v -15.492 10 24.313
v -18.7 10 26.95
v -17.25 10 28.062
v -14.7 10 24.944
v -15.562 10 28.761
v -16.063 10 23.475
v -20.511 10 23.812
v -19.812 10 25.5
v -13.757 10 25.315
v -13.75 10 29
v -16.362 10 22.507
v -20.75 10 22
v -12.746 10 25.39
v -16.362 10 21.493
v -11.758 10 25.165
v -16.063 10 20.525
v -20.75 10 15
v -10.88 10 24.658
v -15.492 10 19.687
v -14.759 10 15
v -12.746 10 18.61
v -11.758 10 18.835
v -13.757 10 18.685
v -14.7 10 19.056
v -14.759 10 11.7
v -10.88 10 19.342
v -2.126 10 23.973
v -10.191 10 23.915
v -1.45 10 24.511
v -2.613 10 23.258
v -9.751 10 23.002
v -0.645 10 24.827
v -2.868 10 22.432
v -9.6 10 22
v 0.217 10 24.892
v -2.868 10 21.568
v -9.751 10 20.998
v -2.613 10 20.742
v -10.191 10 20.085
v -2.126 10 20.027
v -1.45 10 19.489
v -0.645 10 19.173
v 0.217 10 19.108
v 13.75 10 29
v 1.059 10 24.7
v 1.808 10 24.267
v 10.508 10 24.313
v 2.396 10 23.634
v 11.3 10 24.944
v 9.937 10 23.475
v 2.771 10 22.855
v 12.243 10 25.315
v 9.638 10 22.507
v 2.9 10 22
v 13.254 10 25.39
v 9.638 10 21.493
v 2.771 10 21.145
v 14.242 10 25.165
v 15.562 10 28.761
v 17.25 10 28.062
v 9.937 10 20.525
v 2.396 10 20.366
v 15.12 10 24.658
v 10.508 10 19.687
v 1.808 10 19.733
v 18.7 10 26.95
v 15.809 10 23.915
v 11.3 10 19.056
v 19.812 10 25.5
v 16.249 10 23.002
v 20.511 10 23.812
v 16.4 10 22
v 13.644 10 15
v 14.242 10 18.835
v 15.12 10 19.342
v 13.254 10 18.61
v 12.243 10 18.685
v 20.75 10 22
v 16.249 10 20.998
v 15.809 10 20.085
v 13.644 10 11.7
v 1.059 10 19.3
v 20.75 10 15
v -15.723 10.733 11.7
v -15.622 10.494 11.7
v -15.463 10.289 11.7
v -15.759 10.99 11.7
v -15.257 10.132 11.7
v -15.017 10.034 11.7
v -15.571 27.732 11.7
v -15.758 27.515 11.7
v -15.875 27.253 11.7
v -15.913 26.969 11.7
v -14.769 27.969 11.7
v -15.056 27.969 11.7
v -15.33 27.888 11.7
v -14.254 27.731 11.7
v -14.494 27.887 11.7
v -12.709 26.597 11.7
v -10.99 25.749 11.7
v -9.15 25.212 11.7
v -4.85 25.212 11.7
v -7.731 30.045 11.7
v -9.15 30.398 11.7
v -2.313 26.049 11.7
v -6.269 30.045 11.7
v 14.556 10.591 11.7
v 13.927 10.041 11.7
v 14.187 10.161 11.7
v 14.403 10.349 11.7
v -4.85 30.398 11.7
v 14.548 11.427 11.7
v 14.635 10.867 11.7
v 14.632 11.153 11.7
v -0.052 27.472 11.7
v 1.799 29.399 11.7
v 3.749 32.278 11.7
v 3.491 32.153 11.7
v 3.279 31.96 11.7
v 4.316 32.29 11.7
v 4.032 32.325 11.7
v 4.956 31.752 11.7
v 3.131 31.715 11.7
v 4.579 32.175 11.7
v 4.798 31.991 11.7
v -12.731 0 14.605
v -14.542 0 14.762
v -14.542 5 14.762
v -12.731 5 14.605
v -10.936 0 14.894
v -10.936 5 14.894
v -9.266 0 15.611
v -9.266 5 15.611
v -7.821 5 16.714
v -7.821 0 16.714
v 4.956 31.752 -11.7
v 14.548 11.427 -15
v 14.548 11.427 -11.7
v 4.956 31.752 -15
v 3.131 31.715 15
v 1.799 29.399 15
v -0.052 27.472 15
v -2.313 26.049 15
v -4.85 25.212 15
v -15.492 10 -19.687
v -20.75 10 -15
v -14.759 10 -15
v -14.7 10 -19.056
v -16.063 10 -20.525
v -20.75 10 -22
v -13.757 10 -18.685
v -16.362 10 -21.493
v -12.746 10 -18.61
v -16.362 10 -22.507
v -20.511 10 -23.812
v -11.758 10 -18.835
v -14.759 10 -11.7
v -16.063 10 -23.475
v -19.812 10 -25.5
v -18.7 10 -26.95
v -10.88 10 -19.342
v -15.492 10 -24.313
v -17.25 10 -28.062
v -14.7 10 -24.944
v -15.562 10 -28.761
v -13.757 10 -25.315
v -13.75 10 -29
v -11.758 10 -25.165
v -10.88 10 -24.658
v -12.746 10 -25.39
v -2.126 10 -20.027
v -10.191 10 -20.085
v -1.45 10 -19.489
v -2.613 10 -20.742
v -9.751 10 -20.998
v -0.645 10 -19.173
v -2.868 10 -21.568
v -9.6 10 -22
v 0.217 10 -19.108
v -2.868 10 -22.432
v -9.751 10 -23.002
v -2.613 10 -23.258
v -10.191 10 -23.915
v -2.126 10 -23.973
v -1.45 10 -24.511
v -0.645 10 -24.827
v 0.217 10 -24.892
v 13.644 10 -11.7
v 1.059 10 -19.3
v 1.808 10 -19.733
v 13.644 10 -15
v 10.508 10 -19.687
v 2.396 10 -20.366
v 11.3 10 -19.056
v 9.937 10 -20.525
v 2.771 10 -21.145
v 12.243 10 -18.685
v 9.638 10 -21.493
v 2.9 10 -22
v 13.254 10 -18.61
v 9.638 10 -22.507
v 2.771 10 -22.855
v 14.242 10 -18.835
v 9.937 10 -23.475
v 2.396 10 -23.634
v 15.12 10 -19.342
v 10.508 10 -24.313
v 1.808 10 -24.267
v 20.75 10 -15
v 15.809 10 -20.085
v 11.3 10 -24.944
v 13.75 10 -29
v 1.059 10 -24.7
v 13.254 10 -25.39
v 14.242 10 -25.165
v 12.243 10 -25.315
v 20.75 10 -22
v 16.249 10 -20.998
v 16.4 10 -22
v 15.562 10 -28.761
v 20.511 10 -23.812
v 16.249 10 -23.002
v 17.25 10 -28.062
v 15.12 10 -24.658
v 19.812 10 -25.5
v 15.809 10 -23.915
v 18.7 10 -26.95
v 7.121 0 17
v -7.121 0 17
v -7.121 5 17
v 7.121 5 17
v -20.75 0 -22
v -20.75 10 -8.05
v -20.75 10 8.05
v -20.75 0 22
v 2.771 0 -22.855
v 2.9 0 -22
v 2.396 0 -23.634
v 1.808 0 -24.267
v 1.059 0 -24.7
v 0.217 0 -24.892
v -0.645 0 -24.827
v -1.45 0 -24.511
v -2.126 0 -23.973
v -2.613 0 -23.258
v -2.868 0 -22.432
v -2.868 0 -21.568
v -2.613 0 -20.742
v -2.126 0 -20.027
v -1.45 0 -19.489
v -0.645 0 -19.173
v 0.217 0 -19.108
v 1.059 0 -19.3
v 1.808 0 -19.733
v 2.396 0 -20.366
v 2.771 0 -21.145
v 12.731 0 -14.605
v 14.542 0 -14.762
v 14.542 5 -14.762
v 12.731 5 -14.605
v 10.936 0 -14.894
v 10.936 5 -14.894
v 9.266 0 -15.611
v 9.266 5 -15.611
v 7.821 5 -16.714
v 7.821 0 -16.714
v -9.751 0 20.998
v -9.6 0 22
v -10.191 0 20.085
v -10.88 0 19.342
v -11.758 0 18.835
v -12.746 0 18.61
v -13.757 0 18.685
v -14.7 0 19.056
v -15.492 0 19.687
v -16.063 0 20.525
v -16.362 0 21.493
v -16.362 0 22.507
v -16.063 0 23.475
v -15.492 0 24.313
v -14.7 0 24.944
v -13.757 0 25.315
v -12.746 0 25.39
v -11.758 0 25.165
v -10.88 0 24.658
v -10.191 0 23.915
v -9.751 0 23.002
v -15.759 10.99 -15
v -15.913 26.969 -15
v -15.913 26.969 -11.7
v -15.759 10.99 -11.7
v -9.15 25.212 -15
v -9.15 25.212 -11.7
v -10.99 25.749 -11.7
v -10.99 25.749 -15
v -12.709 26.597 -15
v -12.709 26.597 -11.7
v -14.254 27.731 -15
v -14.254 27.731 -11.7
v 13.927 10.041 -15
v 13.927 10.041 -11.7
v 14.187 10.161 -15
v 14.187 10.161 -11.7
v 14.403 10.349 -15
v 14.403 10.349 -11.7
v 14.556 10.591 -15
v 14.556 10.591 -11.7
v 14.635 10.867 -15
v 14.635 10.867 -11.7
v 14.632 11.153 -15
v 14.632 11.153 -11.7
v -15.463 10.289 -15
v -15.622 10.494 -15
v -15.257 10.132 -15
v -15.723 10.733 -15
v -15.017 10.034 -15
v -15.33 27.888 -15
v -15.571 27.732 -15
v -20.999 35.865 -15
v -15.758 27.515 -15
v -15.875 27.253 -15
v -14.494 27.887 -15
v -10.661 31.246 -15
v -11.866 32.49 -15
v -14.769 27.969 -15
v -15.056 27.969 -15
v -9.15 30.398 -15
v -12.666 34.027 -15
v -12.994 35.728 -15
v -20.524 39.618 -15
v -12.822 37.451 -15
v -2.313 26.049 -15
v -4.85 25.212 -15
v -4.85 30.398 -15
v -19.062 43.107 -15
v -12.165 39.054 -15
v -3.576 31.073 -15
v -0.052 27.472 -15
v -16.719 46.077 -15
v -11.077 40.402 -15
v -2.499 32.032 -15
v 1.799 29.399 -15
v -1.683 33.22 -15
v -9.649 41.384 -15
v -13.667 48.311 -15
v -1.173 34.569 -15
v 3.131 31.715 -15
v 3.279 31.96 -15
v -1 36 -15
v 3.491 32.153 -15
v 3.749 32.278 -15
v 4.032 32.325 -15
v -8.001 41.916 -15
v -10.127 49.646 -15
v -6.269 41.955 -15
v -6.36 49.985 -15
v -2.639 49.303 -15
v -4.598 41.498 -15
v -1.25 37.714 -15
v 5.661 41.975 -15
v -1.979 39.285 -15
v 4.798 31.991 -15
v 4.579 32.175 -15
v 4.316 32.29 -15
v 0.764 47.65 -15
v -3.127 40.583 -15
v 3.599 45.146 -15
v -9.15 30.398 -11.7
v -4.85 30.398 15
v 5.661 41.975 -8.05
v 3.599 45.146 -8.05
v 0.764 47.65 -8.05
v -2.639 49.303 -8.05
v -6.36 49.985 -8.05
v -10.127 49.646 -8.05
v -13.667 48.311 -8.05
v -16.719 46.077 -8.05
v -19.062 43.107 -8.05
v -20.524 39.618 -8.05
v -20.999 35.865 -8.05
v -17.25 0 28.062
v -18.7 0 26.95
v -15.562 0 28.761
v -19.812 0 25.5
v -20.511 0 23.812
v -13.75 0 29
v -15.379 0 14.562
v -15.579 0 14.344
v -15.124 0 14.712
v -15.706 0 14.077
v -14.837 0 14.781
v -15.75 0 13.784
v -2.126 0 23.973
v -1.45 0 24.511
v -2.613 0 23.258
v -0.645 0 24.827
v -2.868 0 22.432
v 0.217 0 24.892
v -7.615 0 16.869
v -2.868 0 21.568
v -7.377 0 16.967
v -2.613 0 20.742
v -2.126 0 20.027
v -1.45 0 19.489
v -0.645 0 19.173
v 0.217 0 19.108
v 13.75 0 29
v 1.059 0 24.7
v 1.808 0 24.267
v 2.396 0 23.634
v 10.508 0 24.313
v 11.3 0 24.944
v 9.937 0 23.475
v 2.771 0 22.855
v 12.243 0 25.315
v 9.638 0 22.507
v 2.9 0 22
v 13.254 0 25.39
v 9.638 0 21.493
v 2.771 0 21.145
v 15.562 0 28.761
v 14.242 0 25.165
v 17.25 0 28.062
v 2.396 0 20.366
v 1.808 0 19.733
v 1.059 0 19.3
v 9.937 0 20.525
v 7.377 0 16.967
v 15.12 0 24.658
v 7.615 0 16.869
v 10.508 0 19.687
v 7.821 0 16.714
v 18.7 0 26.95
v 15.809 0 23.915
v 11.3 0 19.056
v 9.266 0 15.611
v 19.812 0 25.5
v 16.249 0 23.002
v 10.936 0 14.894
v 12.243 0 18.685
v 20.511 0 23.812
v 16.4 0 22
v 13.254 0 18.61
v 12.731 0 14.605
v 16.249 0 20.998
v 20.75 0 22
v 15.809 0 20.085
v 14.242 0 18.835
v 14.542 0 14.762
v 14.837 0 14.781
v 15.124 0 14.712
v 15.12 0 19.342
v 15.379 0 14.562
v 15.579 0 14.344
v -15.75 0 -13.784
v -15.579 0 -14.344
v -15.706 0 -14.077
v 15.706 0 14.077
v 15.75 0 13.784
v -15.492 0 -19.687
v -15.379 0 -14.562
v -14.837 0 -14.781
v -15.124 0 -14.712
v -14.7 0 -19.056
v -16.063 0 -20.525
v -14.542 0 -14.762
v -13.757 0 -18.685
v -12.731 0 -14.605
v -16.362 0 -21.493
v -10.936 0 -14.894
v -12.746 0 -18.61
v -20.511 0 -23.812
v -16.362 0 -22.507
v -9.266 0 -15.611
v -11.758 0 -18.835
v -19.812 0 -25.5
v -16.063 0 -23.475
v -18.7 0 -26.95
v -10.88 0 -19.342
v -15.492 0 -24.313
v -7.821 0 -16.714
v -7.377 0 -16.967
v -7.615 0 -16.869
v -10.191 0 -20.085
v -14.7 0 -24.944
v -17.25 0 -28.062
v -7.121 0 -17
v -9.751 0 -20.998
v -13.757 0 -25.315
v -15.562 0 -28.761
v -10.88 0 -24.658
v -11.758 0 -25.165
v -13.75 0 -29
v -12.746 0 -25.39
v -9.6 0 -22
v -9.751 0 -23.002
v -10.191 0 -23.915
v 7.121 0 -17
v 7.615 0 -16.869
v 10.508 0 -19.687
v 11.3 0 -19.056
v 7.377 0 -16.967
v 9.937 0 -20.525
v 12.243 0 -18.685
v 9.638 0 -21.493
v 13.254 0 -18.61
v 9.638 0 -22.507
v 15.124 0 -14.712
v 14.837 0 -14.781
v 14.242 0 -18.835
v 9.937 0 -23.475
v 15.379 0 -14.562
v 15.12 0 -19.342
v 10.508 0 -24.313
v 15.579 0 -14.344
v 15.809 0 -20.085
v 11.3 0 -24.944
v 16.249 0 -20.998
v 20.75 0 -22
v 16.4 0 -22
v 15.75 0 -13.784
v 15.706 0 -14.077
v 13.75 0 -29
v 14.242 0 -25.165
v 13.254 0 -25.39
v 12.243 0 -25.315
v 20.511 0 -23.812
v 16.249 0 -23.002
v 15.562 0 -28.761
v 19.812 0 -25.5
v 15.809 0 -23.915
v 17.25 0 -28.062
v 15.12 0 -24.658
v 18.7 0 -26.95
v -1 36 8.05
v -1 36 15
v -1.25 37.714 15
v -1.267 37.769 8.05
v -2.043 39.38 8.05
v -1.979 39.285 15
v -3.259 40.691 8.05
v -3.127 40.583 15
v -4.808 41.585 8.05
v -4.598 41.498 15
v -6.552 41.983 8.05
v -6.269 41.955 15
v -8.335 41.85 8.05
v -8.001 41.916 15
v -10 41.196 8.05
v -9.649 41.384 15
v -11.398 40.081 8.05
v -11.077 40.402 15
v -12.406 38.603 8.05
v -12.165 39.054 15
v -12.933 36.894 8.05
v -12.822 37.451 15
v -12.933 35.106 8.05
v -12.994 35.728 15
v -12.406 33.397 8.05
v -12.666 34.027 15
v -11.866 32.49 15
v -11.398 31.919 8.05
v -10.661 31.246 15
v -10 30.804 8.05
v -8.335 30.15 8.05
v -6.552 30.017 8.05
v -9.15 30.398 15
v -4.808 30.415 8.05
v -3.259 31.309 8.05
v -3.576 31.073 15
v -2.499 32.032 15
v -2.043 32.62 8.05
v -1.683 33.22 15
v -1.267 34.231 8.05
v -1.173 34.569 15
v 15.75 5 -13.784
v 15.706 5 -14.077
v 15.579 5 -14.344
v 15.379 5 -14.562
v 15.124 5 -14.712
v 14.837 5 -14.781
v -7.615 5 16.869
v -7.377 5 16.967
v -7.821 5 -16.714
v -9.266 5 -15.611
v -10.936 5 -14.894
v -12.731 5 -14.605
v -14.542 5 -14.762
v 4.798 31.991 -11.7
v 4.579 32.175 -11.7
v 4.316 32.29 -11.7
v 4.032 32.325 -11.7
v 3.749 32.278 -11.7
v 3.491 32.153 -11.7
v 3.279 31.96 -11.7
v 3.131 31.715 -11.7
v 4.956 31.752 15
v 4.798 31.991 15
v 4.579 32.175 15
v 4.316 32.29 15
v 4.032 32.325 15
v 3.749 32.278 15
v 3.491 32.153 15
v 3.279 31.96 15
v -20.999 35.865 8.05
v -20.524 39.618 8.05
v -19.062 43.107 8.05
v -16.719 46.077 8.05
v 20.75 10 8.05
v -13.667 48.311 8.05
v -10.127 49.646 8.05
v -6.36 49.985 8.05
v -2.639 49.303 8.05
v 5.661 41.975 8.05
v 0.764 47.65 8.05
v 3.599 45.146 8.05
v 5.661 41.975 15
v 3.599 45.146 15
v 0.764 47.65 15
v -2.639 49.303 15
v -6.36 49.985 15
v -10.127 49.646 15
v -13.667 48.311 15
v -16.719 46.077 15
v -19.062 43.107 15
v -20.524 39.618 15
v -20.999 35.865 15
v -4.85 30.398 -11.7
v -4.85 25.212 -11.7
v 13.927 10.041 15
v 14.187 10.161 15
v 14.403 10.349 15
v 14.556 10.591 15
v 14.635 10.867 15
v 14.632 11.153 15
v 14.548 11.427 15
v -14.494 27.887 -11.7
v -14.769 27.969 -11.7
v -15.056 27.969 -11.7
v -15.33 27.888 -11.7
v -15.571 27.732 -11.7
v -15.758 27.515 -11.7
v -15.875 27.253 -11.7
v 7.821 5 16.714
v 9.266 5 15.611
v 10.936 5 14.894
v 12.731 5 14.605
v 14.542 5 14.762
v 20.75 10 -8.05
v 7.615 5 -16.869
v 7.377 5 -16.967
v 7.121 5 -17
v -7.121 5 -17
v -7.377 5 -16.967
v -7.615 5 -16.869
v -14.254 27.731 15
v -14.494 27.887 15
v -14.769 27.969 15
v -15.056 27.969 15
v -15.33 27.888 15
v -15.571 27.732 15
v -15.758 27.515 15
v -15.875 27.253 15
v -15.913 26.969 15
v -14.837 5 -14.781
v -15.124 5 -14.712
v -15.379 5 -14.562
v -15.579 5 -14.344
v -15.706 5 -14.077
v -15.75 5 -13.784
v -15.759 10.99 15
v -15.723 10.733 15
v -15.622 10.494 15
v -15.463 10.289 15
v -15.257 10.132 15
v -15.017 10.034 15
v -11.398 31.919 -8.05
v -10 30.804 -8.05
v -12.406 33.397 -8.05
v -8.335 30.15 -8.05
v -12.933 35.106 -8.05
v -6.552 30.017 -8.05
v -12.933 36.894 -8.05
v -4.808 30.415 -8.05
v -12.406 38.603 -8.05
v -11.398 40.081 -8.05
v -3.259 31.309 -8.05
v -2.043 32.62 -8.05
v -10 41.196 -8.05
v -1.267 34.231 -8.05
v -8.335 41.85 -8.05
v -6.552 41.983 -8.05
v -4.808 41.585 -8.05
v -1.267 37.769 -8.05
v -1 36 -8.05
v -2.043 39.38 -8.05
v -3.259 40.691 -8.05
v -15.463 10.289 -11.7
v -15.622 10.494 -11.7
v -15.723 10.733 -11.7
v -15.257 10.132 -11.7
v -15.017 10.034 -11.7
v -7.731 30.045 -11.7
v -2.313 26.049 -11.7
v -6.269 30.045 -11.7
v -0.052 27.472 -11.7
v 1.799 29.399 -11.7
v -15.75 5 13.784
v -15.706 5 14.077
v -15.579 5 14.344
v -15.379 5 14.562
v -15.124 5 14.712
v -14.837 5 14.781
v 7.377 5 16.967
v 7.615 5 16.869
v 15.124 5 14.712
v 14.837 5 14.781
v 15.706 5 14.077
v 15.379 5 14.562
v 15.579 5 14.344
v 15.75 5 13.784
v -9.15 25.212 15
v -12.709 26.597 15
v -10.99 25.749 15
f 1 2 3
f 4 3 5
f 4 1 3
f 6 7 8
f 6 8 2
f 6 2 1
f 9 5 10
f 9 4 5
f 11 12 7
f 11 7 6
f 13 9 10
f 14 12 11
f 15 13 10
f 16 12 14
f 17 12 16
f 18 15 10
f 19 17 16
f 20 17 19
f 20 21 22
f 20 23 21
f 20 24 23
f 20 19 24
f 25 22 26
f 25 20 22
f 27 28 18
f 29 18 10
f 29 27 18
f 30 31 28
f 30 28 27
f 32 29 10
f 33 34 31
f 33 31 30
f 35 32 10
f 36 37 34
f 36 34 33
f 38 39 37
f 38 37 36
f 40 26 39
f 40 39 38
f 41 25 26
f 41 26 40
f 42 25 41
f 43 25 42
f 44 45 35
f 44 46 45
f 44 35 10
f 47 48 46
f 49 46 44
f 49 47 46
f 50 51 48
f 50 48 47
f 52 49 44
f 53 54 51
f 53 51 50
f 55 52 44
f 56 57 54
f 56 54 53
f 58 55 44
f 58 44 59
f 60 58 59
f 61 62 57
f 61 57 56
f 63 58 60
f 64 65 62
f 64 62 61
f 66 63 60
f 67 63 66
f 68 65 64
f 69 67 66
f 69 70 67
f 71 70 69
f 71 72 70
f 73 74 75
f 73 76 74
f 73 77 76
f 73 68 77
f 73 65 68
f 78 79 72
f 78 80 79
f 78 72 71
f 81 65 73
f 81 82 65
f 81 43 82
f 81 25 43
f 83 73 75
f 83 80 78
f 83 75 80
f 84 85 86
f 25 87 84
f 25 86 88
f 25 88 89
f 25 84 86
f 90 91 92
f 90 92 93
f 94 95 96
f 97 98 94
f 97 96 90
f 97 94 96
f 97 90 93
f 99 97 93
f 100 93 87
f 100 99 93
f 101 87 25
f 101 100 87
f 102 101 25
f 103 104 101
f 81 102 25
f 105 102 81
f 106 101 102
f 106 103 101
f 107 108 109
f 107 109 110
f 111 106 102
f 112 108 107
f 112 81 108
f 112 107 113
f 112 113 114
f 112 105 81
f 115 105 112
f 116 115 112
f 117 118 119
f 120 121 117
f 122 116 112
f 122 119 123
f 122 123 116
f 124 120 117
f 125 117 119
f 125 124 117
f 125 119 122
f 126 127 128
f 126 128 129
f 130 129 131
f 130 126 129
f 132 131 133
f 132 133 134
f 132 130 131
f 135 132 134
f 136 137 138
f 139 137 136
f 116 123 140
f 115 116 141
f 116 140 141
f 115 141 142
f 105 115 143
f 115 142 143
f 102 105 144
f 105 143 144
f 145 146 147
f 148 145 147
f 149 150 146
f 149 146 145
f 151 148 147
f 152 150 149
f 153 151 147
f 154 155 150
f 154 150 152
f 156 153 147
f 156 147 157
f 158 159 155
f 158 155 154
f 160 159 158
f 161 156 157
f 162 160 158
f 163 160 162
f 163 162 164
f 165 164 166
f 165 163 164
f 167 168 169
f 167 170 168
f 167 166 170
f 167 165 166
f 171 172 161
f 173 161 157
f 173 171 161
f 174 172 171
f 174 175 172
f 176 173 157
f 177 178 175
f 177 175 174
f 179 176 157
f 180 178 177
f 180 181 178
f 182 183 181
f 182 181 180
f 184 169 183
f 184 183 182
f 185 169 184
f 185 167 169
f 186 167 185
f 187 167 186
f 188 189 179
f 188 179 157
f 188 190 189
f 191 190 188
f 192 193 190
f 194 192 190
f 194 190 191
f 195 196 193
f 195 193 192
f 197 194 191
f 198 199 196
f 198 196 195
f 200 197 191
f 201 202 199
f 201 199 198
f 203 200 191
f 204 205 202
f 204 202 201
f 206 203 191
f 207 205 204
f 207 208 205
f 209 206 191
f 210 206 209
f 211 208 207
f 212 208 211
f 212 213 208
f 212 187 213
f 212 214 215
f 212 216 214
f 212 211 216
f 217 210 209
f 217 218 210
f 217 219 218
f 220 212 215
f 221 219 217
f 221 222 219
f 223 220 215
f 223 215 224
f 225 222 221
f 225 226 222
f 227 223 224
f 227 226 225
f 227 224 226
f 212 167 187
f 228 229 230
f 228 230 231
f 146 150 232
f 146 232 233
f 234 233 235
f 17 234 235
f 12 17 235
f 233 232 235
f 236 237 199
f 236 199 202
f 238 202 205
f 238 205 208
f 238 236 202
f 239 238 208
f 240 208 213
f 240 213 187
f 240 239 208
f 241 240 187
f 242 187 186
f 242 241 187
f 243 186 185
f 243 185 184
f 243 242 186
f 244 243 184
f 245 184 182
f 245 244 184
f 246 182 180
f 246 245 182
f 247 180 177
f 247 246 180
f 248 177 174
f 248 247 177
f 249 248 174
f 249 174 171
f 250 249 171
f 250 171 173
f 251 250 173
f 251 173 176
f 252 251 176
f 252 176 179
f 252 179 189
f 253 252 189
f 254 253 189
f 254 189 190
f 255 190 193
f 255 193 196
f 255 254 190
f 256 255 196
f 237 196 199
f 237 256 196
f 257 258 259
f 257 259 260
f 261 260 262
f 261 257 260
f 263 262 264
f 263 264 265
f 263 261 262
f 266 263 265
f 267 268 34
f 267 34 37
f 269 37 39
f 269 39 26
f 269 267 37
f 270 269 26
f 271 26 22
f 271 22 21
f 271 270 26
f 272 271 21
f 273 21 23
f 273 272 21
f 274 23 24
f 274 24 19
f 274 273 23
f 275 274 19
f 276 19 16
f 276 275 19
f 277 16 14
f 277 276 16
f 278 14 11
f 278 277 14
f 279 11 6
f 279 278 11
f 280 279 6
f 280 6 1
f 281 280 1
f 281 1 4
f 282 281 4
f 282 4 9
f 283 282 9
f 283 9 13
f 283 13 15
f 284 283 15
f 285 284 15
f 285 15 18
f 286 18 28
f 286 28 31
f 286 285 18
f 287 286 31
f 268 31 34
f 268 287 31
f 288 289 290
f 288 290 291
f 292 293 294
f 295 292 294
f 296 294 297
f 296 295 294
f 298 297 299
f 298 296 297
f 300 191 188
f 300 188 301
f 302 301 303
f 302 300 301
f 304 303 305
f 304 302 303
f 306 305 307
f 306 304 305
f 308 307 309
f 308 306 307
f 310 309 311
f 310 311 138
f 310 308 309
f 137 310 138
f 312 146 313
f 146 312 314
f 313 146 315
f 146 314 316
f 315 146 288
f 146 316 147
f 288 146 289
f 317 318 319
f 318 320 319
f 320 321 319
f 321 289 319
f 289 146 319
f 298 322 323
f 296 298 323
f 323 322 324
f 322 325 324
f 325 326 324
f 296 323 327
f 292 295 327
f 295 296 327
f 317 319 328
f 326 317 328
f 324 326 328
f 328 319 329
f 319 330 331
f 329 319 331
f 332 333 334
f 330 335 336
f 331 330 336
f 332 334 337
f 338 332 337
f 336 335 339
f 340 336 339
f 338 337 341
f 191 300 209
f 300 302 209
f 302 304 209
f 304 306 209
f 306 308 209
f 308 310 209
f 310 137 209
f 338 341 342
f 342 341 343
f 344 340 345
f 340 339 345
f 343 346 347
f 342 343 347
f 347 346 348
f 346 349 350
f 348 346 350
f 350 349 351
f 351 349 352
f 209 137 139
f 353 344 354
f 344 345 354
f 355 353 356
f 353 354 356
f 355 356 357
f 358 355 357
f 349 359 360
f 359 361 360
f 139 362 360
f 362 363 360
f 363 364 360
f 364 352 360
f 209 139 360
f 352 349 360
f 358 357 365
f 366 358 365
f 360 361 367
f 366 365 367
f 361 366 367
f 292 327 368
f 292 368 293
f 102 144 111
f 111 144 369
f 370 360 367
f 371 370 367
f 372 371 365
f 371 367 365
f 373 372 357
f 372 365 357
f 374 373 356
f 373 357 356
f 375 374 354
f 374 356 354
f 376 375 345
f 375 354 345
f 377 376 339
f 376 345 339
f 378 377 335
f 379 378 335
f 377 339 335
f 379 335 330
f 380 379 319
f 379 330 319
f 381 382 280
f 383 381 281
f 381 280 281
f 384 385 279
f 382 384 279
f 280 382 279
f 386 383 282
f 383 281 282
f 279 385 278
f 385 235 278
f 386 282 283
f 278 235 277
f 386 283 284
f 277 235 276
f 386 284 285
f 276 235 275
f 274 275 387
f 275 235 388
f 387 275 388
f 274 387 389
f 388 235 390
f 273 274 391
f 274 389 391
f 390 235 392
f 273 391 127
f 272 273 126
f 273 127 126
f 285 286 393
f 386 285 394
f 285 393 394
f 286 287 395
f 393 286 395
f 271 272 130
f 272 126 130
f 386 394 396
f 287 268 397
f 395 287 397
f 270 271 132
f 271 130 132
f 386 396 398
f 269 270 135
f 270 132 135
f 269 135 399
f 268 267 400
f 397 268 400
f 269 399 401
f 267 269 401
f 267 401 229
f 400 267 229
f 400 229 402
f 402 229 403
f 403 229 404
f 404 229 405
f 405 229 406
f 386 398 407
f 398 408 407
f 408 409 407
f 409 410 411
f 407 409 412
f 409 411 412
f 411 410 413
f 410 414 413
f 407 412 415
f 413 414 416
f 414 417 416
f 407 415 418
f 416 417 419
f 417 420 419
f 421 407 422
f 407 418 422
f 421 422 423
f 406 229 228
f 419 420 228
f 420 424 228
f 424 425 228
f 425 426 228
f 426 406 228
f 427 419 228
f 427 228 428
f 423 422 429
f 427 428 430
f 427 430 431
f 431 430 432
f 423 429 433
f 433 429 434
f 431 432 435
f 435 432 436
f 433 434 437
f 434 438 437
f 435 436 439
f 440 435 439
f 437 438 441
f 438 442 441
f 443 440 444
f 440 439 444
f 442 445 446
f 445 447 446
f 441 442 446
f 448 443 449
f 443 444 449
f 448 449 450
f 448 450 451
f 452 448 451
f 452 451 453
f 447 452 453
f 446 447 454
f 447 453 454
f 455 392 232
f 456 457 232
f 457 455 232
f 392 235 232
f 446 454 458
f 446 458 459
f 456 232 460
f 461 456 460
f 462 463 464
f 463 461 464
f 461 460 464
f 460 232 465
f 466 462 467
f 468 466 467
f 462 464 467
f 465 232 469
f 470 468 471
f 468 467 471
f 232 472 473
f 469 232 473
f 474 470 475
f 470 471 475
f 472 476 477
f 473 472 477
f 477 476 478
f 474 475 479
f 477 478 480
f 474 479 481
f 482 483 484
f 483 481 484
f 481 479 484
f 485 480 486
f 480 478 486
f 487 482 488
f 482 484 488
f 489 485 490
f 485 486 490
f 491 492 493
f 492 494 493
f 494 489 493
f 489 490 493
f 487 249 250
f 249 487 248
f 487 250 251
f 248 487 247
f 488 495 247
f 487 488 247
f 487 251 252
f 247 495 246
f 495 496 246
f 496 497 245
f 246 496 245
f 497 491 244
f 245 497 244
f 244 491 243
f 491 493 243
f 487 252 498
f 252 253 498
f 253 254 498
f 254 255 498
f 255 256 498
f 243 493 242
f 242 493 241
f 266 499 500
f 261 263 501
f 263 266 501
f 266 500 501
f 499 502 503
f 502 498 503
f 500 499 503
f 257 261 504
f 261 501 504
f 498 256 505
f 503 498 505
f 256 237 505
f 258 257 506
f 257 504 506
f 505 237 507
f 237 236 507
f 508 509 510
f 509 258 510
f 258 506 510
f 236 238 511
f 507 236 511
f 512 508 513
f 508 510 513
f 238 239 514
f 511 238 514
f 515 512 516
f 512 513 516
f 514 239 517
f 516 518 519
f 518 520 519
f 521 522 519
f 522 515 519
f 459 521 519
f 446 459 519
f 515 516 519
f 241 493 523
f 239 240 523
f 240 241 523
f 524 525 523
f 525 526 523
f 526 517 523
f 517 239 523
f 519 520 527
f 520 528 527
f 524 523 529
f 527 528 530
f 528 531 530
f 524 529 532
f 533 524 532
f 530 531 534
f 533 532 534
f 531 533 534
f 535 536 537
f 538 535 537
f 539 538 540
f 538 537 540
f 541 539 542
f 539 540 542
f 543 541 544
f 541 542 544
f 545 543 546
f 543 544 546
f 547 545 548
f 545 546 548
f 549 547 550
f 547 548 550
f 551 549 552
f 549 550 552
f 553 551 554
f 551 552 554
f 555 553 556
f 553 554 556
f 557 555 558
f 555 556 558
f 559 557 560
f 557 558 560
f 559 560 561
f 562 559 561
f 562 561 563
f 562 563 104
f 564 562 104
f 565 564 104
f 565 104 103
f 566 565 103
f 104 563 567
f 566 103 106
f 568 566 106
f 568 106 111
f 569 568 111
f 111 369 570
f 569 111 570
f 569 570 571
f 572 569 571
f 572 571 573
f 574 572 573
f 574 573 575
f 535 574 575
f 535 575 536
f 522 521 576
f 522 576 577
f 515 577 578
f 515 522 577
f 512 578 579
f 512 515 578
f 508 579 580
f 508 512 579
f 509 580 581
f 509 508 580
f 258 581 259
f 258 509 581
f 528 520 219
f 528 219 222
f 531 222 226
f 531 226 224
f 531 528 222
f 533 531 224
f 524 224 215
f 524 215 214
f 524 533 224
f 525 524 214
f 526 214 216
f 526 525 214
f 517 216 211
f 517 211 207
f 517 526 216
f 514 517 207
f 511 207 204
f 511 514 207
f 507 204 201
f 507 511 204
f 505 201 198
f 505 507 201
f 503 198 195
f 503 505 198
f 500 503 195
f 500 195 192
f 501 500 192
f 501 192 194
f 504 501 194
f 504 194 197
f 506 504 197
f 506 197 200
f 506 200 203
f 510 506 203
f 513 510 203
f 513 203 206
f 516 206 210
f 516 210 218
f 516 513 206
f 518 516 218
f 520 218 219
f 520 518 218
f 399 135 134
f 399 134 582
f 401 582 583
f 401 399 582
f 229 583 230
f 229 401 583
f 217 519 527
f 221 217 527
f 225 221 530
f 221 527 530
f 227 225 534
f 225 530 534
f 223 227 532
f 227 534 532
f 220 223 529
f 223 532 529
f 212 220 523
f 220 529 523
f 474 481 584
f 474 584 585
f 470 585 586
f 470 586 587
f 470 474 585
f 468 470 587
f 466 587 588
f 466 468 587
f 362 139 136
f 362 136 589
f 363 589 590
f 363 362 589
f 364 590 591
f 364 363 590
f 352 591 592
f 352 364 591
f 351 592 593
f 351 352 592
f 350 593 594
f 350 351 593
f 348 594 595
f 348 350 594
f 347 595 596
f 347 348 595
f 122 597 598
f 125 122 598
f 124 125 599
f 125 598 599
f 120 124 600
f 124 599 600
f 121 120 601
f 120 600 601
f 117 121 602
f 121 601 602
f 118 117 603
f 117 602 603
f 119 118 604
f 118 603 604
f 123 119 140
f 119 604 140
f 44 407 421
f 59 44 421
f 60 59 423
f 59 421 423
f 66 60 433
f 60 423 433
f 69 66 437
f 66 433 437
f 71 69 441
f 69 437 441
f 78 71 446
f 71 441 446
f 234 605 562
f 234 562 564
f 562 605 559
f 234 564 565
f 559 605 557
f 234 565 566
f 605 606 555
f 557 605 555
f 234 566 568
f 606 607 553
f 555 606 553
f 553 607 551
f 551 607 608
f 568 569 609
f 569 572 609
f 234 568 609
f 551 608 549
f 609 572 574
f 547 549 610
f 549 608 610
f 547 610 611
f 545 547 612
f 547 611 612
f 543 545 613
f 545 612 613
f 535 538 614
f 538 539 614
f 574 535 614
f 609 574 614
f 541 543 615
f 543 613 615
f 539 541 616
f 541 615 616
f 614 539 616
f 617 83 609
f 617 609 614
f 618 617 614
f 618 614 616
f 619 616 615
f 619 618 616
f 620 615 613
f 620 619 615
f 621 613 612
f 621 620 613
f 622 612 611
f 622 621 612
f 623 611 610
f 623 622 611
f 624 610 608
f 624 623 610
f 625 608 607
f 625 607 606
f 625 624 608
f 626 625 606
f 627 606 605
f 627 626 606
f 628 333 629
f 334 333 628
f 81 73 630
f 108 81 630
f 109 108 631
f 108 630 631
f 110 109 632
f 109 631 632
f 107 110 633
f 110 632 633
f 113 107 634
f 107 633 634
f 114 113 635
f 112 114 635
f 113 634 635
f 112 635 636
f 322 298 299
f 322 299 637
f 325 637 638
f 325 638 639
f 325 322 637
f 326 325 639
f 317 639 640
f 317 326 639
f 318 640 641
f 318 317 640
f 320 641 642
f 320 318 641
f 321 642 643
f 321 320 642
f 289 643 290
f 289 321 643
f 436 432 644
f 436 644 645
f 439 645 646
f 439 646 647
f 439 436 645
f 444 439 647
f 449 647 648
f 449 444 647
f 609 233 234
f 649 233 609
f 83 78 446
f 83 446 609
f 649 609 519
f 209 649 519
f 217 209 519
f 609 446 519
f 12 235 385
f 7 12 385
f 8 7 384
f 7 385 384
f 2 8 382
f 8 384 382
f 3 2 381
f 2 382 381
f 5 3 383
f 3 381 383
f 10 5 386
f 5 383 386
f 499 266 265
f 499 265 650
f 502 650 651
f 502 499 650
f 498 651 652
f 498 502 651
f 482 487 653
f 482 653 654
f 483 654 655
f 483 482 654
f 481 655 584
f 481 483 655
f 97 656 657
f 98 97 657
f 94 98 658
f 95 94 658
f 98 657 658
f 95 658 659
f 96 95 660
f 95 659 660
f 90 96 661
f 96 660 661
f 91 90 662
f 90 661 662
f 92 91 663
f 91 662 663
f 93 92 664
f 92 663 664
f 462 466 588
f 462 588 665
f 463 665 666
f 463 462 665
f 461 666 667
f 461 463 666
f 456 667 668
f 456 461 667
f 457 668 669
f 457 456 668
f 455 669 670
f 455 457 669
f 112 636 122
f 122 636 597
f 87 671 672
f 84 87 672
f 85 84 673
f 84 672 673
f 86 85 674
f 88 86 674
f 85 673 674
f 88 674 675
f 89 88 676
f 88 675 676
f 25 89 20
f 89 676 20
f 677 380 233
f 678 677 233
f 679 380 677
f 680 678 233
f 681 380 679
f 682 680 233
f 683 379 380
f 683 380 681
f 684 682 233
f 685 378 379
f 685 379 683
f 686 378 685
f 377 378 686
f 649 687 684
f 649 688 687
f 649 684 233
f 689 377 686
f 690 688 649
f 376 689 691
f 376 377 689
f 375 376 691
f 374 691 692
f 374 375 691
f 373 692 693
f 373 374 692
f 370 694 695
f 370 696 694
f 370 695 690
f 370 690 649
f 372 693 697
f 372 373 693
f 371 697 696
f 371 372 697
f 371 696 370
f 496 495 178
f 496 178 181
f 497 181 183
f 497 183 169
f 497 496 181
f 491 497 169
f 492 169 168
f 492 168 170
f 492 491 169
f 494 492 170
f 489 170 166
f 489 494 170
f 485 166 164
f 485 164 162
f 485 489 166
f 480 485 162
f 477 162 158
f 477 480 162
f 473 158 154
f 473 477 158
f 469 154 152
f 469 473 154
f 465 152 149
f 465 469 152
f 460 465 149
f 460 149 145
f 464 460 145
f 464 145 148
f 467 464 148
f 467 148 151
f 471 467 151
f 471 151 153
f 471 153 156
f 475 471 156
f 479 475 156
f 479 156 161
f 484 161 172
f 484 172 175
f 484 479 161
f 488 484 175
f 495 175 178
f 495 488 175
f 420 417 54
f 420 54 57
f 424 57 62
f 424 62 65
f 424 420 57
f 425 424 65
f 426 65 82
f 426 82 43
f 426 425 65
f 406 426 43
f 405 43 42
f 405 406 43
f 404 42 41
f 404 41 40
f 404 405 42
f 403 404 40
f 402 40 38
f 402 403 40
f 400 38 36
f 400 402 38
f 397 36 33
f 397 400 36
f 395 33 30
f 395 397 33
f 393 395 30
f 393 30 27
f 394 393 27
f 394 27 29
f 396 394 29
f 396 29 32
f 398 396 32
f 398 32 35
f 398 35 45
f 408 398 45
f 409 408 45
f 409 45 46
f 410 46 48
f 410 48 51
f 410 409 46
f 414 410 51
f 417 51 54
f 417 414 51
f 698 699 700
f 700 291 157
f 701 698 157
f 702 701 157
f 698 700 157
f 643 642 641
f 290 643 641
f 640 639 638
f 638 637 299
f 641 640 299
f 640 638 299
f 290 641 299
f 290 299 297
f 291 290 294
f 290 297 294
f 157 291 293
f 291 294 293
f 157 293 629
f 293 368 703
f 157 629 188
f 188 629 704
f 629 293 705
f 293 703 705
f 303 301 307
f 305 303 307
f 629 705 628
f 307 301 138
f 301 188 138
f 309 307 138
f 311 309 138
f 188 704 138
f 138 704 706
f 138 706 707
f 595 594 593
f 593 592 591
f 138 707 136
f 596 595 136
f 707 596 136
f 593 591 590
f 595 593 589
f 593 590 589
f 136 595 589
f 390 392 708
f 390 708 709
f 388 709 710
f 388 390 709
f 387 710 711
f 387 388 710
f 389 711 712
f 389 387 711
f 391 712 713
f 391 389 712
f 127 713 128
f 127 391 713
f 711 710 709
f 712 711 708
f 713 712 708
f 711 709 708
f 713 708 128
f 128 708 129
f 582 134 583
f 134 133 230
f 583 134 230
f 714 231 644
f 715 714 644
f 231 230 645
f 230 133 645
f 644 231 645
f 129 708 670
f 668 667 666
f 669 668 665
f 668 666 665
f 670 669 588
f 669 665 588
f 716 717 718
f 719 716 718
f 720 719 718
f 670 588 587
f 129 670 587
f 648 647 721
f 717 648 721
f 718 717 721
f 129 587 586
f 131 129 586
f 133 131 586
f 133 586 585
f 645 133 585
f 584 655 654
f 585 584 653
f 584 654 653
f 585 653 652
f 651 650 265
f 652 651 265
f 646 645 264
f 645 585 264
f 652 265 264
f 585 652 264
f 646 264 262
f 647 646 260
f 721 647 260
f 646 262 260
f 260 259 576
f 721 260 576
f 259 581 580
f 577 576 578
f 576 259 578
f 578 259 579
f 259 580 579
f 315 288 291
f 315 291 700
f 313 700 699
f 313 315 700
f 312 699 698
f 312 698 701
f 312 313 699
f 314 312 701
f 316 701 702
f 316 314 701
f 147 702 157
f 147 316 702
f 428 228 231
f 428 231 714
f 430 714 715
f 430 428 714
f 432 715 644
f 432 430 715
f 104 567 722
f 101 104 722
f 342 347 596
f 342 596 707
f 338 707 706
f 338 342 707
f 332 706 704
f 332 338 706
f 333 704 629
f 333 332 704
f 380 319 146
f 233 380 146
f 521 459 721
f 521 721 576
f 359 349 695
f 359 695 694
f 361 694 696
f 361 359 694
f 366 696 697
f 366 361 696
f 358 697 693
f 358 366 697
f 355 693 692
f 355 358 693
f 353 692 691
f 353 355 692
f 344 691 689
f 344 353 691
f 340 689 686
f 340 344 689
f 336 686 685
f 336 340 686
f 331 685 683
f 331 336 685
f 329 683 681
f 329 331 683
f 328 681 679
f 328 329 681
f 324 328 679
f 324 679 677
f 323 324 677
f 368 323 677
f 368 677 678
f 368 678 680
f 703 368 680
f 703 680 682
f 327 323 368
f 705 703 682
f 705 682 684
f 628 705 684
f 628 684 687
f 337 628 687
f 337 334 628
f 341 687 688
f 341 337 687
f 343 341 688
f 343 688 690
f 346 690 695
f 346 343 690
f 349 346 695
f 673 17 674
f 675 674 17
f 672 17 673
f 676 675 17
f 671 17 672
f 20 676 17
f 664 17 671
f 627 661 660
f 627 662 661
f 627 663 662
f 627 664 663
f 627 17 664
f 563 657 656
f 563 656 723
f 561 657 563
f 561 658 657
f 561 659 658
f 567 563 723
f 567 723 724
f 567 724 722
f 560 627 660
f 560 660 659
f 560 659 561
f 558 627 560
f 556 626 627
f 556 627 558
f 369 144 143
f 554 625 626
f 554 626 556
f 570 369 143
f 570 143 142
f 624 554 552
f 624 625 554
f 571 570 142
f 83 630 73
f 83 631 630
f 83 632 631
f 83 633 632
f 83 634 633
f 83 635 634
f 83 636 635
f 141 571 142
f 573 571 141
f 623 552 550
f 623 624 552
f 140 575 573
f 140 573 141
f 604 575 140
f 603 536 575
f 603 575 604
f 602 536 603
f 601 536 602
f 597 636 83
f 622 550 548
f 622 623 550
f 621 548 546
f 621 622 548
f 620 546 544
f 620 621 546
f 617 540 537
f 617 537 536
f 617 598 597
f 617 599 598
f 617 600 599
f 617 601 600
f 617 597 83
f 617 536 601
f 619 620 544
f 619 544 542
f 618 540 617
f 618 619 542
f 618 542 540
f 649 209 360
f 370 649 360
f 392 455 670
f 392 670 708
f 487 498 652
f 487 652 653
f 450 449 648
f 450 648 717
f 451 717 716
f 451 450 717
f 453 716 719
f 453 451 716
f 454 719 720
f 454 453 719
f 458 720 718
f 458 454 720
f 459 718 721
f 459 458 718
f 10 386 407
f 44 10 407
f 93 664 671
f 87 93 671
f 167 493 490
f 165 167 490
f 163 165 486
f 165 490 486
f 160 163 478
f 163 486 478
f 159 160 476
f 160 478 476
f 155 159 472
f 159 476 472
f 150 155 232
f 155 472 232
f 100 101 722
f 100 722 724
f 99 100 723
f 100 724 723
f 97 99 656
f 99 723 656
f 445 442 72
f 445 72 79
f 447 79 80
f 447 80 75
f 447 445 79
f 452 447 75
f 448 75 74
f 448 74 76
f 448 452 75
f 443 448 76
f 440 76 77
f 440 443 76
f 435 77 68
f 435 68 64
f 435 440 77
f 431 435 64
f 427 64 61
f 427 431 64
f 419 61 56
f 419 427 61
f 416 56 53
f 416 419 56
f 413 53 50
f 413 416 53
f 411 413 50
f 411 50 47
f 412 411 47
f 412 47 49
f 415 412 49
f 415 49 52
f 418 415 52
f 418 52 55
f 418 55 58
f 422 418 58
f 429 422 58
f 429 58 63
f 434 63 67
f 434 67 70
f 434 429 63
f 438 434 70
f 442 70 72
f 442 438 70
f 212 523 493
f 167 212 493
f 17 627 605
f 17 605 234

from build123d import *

# Parameters (mm, degrees)
SKETCH1_R               = 3.4
SKETCH1_R_2             = 2.9
BOSS_EXTRUDE1_DEPTH     = 10
CUT_EXTRUDE1_DEPTH      = 5
SKETCH3_R               = 6
BOSS_EXTRUDE2_DEPTH     = 6.95
CUT_EXTRUDE2_DEPTH      = 3.3
SKETCH5_R               = 6
BOSS_EXTRUDE3_DEPTH     = 6.95
CUT_EXTRUDE3_DEPTH      = 3.3
CUT_EXTRUDE4_DEPTH      = 3.3
CUT_EXTRUDE4_DEPTH_BACK = 3.3
CUT_EXTRUDE5_DEPTH      = 3.3
CUT_EXTRUDE5_DEPTH_BACK = 3.3


with BuildPart() as part:
    # Sketch1 → Boss-Extrude1 (new body)
    with BuildSketch(Plane(origin=(0, 0, 0), x_dir=(1, 0, 0), z_dir=(0, 1, 0))):
        with BuildLine():
            Line((-13.75, -29), (13.75, -29))
            ThreePointArc((13.75, -29), (18.699747468, -26.949747468), (20.75, -22))
            Line((20.75, -22), (20.75, 22))
            ThreePointArc((20.75, 22), (18.699747468, 26.949747468), (13.75, 29))
            Line((13.75, 29), (-13.75, 29))
            ThreePointArc((-13.75, 29), (-18.699747468, 26.949747468), (-20.75, 22))
            Line((-20.75, 22), (-20.75, -22))
            ThreePointArc((-20.75, -22), (-18.699747468, -26.949747468), (-13.75, -29))
        make_face()
        with Locations((13, 22)):
            Circle(SKETCH1_R, mode=Mode.SUBTRACT)
        with Locations((13, -22)):
            Circle(SKETCH1_R, mode=Mode.SUBTRACT)
        with Locations((0, 22)):
            Circle(SKETCH1_R_2, mode=Mode.SUBTRACT)
        with Locations((0, -22)):
            Circle(SKETCH1_R_2, mode=Mode.SUBTRACT)
        with Locations((-13, 22)):
            Circle(SKETCH1_R, mode=Mode.SUBTRACT)
        with Locations((-13, -22)):
            Circle(SKETCH1_R, mode=Mode.SUBTRACT)
    extrude(amount=BOSS_EXTRUDE1_DEPTH)

    # Sketch2 → Cut-Extrude1 (cut)
    with BuildSketch(Plane(origin=(0, 0, 0), x_dir=(1, 0, 0), z_dir=(0, 1, 0))):
        with BuildLine():
            Line((-7.121224617, -17), (7.121224617, -17))
            ThreePointArc((7.121224617, -17), (7.499189081, -16.925820104), (7.821078814, -16.714285729))
            ThreePointArc((7.821078814, -16.714285729), (10.936048151, -14.893657568), (14.541666667, -14.762371667))
            ThreePointArc((14.541666667, -14.762371667), (15.37915287, -14.561595372), (15.75, -13.784313784))
            Line((15.75, -13.784313784), (15.75, 13.784313784))
            ThreePointArc((15.75, 13.784313784), (15.379152861, 14.561595378), (14.541666646, 14.762371662))
            ThreePointArc((14.541666646, 14.762371662), (10.936048151, 14.893657568), (7.82107883, 16.714285714))
            ThreePointArc((7.82107883, 16.714285714), (7.49918909, 16.9258201), (7.121224617, 17))
            Line((7.121224617, 17), (-7.121224617, 17))
            ThreePointArc((-7.121224617, 17), (-7.499189081, 16.925820104), (-7.821078814, 16.714285729))
            ThreePointArc((-7.821078814, 16.714285729), (-10.936048151, 14.893657568), (-14.541666667, 14.762371667))
            ThreePointArc((-14.541666667, 14.762371667), (-15.37915287, 14.561595372), (-15.75, 13.784313784))
            Line((-15.75, 13.784313784), (-15.75, -13.784313784))
            ThreePointArc((-15.75, -13.784313784), (-15.379152861, -14.561595378), (-14.541666646, -14.762371662))
            ThreePointArc((-14.541666646, -14.762371662), (-10.936048151, -14.893657568), (-7.82107883, -16.714285714))
            ThreePointArc((-7.82107883, -16.714285714), (-7.49918909, -16.9258201), (-7.121224617, -17))
        make_face()
    extrude(amount=CUT_EXTRUDE1_DEPTH, mode=Mode.SUBTRACT)

    # Sketch3 → Boss-Extrude2 (add)
    with BuildSketch(Plane.XY.offset(15)):
        with BuildLine():
            Line((-20.999349483, 35.865040592), (-20.75, 10))
            Line((-20.75, 10), (20.75, 10))
            Line((20.75, 10), (5.66104691, 41.974771221))
            ThreePointArc((5.66104691, 41.974771221), (-10.127293644, 49.646246168), (-20.999349483, 35.865040592))
        make_face()
        with Locations((-7, 36)):
            Circle(SKETCH3_R, mode=Mode.SUBTRACT)
    extrude(amount=-BOSS_EXTRUDE2_DEPTH)

    # Sketch4 → Cut-Extrude2 (cut)
    with BuildSketch(Plane.XY.offset(15)):
        with BuildLine():
            Line((-15.913359408, 26.969384071), (-15.759315134, 10.990360042))
            ThreePointArc((-15.759315134, 10.990360042), (-15.463051888, 10.289493154), (-14.7593616, 10))
            Line((-14.7593616, 10), (13.643575716, 10))
            ThreePointArc((13.643575716, 10), (14.488196747, 10.464635345), (14.54793621, 11.426769373))
            Line((14.54793621, 11.426769373), (4.956385757, 31.752078197))
            ThreePointArc((4.956385757, 31.752078197), (4.031643534, 32.325101095), (3.131023158, 31.714866422))
            ThreePointArc((3.131023158, 31.714866422), (-4.542840608, 25.277949463), (-14.253955229, 27.73077189))
            ThreePointArc((-14.253955229, 27.73077189), (-15.330435138, 27.887917087), (-15.913359408, 26.969384071))
        make_face()
    extrude(amount=-CUT_EXTRUDE2_DEPTH, mode=Mode.SUBTRACT)

    # Sketch5 → Boss-Extrude3 (add)
    with BuildSketch(Plane.XY.offset(-15)):
        with BuildLine():
            Line((-20.999349483, 35.865040592), (-20.75, 10))
            Line((-20.75, 10), (20.75, 10))
            Line((20.75, 10), (5.66104691, 41.974771221))
            ThreePointArc((5.66104691, 41.974771221), (-10.127293644, 49.646246168), (-20.999349483, 35.865040592))
        make_face()
        with Locations((-7, 36)):
            Circle(SKETCH5_R, mode=Mode.SUBTRACT)
    extrude(amount=BOSS_EXTRUDE3_DEPTH)

    # Sketch6 → Cut-Extrude3 (cut)
    with BuildSketch(Plane.XY.offset(-15)):
        with BuildLine():
            Line((-15.913359408, 26.969384071), (-15.759315134, 10.990360042))
            ThreePointArc((-15.759315134, 10.990360042), (-15.463051888, 10.289493154), (-14.7593616, 10))
            Line((-14.7593616, 10), (13.643575716, 10))
            ThreePointArc((13.643575716, 10), (14.488196747, 10.464635345), (14.54793621, 11.426769373))
            Line((14.54793621, 11.426769373), (4.956385757, 31.752078197))
            ThreePointArc((4.956385757, 31.752078197), (4.031643534, 32.325101095), (3.131023158, 31.714866422))
            ThreePointArc((3.131023158, 31.714866422), (-4.542840608, 25.277949463), (-14.253955229, 27.73077189))
            ThreePointArc((-14.253955229, 27.73077189), (-15.330435138, 27.887917087), (-15.913359408, 26.969384071))
        make_face()
    extrude(amount=CUT_EXTRUDE3_DEPTH, mode=Mode.SUBTRACT)

    # Sketch7 → Cut-Extrude4 (cut, two sides)
    with BuildSketch(Plane.XY.offset(15)) as cut_extrude4_sk:
        with BuildLine():
            Line((-4.85, 23.15), (-4.85, 36))
            Line((-4.85, 36), (-9.15, 36))
            Line((-9.15, 36), (-9.15, 23.15))
            ThreePointArc((-9.15, 23.15), (-7, 21), (-4.85, 23.15))
        make_face()
    extrude(amount=CUT_EXTRUDE4_DEPTH, mode=Mode.SUBTRACT)
    extrude(cut_extrude4_sk.sketch, amount=-CUT_EXTRUDE4_DEPTH_BACK, mode=Mode.SUBTRACT)

    # Sketch8 → Cut-Extrude5 (cut, two sides)
    with BuildSketch(Plane.XY.offset(-15)) as cut_extrude5_sk:
        with BuildLine():
            Line((-4.85, 23.15), (-4.85, 36))
            Line((-4.85, 36), (-9.15, 36))
            Line((-9.15, 36), (-9.15, 23.15))
            ThreePointArc((-9.15, 23.15), (-7, 21), (-4.85, 23.15))
        make_face()
    extrude(amount=CUT_EXTRUDE5_DEPTH, mode=Mode.SUBTRACT)
    extrude(cut_extrude5_sk.sketch, amount=-CUT_EXTRUDE5_DEPTH_BACK, mode=Mode.SUBTRACT)


solid = part.part
